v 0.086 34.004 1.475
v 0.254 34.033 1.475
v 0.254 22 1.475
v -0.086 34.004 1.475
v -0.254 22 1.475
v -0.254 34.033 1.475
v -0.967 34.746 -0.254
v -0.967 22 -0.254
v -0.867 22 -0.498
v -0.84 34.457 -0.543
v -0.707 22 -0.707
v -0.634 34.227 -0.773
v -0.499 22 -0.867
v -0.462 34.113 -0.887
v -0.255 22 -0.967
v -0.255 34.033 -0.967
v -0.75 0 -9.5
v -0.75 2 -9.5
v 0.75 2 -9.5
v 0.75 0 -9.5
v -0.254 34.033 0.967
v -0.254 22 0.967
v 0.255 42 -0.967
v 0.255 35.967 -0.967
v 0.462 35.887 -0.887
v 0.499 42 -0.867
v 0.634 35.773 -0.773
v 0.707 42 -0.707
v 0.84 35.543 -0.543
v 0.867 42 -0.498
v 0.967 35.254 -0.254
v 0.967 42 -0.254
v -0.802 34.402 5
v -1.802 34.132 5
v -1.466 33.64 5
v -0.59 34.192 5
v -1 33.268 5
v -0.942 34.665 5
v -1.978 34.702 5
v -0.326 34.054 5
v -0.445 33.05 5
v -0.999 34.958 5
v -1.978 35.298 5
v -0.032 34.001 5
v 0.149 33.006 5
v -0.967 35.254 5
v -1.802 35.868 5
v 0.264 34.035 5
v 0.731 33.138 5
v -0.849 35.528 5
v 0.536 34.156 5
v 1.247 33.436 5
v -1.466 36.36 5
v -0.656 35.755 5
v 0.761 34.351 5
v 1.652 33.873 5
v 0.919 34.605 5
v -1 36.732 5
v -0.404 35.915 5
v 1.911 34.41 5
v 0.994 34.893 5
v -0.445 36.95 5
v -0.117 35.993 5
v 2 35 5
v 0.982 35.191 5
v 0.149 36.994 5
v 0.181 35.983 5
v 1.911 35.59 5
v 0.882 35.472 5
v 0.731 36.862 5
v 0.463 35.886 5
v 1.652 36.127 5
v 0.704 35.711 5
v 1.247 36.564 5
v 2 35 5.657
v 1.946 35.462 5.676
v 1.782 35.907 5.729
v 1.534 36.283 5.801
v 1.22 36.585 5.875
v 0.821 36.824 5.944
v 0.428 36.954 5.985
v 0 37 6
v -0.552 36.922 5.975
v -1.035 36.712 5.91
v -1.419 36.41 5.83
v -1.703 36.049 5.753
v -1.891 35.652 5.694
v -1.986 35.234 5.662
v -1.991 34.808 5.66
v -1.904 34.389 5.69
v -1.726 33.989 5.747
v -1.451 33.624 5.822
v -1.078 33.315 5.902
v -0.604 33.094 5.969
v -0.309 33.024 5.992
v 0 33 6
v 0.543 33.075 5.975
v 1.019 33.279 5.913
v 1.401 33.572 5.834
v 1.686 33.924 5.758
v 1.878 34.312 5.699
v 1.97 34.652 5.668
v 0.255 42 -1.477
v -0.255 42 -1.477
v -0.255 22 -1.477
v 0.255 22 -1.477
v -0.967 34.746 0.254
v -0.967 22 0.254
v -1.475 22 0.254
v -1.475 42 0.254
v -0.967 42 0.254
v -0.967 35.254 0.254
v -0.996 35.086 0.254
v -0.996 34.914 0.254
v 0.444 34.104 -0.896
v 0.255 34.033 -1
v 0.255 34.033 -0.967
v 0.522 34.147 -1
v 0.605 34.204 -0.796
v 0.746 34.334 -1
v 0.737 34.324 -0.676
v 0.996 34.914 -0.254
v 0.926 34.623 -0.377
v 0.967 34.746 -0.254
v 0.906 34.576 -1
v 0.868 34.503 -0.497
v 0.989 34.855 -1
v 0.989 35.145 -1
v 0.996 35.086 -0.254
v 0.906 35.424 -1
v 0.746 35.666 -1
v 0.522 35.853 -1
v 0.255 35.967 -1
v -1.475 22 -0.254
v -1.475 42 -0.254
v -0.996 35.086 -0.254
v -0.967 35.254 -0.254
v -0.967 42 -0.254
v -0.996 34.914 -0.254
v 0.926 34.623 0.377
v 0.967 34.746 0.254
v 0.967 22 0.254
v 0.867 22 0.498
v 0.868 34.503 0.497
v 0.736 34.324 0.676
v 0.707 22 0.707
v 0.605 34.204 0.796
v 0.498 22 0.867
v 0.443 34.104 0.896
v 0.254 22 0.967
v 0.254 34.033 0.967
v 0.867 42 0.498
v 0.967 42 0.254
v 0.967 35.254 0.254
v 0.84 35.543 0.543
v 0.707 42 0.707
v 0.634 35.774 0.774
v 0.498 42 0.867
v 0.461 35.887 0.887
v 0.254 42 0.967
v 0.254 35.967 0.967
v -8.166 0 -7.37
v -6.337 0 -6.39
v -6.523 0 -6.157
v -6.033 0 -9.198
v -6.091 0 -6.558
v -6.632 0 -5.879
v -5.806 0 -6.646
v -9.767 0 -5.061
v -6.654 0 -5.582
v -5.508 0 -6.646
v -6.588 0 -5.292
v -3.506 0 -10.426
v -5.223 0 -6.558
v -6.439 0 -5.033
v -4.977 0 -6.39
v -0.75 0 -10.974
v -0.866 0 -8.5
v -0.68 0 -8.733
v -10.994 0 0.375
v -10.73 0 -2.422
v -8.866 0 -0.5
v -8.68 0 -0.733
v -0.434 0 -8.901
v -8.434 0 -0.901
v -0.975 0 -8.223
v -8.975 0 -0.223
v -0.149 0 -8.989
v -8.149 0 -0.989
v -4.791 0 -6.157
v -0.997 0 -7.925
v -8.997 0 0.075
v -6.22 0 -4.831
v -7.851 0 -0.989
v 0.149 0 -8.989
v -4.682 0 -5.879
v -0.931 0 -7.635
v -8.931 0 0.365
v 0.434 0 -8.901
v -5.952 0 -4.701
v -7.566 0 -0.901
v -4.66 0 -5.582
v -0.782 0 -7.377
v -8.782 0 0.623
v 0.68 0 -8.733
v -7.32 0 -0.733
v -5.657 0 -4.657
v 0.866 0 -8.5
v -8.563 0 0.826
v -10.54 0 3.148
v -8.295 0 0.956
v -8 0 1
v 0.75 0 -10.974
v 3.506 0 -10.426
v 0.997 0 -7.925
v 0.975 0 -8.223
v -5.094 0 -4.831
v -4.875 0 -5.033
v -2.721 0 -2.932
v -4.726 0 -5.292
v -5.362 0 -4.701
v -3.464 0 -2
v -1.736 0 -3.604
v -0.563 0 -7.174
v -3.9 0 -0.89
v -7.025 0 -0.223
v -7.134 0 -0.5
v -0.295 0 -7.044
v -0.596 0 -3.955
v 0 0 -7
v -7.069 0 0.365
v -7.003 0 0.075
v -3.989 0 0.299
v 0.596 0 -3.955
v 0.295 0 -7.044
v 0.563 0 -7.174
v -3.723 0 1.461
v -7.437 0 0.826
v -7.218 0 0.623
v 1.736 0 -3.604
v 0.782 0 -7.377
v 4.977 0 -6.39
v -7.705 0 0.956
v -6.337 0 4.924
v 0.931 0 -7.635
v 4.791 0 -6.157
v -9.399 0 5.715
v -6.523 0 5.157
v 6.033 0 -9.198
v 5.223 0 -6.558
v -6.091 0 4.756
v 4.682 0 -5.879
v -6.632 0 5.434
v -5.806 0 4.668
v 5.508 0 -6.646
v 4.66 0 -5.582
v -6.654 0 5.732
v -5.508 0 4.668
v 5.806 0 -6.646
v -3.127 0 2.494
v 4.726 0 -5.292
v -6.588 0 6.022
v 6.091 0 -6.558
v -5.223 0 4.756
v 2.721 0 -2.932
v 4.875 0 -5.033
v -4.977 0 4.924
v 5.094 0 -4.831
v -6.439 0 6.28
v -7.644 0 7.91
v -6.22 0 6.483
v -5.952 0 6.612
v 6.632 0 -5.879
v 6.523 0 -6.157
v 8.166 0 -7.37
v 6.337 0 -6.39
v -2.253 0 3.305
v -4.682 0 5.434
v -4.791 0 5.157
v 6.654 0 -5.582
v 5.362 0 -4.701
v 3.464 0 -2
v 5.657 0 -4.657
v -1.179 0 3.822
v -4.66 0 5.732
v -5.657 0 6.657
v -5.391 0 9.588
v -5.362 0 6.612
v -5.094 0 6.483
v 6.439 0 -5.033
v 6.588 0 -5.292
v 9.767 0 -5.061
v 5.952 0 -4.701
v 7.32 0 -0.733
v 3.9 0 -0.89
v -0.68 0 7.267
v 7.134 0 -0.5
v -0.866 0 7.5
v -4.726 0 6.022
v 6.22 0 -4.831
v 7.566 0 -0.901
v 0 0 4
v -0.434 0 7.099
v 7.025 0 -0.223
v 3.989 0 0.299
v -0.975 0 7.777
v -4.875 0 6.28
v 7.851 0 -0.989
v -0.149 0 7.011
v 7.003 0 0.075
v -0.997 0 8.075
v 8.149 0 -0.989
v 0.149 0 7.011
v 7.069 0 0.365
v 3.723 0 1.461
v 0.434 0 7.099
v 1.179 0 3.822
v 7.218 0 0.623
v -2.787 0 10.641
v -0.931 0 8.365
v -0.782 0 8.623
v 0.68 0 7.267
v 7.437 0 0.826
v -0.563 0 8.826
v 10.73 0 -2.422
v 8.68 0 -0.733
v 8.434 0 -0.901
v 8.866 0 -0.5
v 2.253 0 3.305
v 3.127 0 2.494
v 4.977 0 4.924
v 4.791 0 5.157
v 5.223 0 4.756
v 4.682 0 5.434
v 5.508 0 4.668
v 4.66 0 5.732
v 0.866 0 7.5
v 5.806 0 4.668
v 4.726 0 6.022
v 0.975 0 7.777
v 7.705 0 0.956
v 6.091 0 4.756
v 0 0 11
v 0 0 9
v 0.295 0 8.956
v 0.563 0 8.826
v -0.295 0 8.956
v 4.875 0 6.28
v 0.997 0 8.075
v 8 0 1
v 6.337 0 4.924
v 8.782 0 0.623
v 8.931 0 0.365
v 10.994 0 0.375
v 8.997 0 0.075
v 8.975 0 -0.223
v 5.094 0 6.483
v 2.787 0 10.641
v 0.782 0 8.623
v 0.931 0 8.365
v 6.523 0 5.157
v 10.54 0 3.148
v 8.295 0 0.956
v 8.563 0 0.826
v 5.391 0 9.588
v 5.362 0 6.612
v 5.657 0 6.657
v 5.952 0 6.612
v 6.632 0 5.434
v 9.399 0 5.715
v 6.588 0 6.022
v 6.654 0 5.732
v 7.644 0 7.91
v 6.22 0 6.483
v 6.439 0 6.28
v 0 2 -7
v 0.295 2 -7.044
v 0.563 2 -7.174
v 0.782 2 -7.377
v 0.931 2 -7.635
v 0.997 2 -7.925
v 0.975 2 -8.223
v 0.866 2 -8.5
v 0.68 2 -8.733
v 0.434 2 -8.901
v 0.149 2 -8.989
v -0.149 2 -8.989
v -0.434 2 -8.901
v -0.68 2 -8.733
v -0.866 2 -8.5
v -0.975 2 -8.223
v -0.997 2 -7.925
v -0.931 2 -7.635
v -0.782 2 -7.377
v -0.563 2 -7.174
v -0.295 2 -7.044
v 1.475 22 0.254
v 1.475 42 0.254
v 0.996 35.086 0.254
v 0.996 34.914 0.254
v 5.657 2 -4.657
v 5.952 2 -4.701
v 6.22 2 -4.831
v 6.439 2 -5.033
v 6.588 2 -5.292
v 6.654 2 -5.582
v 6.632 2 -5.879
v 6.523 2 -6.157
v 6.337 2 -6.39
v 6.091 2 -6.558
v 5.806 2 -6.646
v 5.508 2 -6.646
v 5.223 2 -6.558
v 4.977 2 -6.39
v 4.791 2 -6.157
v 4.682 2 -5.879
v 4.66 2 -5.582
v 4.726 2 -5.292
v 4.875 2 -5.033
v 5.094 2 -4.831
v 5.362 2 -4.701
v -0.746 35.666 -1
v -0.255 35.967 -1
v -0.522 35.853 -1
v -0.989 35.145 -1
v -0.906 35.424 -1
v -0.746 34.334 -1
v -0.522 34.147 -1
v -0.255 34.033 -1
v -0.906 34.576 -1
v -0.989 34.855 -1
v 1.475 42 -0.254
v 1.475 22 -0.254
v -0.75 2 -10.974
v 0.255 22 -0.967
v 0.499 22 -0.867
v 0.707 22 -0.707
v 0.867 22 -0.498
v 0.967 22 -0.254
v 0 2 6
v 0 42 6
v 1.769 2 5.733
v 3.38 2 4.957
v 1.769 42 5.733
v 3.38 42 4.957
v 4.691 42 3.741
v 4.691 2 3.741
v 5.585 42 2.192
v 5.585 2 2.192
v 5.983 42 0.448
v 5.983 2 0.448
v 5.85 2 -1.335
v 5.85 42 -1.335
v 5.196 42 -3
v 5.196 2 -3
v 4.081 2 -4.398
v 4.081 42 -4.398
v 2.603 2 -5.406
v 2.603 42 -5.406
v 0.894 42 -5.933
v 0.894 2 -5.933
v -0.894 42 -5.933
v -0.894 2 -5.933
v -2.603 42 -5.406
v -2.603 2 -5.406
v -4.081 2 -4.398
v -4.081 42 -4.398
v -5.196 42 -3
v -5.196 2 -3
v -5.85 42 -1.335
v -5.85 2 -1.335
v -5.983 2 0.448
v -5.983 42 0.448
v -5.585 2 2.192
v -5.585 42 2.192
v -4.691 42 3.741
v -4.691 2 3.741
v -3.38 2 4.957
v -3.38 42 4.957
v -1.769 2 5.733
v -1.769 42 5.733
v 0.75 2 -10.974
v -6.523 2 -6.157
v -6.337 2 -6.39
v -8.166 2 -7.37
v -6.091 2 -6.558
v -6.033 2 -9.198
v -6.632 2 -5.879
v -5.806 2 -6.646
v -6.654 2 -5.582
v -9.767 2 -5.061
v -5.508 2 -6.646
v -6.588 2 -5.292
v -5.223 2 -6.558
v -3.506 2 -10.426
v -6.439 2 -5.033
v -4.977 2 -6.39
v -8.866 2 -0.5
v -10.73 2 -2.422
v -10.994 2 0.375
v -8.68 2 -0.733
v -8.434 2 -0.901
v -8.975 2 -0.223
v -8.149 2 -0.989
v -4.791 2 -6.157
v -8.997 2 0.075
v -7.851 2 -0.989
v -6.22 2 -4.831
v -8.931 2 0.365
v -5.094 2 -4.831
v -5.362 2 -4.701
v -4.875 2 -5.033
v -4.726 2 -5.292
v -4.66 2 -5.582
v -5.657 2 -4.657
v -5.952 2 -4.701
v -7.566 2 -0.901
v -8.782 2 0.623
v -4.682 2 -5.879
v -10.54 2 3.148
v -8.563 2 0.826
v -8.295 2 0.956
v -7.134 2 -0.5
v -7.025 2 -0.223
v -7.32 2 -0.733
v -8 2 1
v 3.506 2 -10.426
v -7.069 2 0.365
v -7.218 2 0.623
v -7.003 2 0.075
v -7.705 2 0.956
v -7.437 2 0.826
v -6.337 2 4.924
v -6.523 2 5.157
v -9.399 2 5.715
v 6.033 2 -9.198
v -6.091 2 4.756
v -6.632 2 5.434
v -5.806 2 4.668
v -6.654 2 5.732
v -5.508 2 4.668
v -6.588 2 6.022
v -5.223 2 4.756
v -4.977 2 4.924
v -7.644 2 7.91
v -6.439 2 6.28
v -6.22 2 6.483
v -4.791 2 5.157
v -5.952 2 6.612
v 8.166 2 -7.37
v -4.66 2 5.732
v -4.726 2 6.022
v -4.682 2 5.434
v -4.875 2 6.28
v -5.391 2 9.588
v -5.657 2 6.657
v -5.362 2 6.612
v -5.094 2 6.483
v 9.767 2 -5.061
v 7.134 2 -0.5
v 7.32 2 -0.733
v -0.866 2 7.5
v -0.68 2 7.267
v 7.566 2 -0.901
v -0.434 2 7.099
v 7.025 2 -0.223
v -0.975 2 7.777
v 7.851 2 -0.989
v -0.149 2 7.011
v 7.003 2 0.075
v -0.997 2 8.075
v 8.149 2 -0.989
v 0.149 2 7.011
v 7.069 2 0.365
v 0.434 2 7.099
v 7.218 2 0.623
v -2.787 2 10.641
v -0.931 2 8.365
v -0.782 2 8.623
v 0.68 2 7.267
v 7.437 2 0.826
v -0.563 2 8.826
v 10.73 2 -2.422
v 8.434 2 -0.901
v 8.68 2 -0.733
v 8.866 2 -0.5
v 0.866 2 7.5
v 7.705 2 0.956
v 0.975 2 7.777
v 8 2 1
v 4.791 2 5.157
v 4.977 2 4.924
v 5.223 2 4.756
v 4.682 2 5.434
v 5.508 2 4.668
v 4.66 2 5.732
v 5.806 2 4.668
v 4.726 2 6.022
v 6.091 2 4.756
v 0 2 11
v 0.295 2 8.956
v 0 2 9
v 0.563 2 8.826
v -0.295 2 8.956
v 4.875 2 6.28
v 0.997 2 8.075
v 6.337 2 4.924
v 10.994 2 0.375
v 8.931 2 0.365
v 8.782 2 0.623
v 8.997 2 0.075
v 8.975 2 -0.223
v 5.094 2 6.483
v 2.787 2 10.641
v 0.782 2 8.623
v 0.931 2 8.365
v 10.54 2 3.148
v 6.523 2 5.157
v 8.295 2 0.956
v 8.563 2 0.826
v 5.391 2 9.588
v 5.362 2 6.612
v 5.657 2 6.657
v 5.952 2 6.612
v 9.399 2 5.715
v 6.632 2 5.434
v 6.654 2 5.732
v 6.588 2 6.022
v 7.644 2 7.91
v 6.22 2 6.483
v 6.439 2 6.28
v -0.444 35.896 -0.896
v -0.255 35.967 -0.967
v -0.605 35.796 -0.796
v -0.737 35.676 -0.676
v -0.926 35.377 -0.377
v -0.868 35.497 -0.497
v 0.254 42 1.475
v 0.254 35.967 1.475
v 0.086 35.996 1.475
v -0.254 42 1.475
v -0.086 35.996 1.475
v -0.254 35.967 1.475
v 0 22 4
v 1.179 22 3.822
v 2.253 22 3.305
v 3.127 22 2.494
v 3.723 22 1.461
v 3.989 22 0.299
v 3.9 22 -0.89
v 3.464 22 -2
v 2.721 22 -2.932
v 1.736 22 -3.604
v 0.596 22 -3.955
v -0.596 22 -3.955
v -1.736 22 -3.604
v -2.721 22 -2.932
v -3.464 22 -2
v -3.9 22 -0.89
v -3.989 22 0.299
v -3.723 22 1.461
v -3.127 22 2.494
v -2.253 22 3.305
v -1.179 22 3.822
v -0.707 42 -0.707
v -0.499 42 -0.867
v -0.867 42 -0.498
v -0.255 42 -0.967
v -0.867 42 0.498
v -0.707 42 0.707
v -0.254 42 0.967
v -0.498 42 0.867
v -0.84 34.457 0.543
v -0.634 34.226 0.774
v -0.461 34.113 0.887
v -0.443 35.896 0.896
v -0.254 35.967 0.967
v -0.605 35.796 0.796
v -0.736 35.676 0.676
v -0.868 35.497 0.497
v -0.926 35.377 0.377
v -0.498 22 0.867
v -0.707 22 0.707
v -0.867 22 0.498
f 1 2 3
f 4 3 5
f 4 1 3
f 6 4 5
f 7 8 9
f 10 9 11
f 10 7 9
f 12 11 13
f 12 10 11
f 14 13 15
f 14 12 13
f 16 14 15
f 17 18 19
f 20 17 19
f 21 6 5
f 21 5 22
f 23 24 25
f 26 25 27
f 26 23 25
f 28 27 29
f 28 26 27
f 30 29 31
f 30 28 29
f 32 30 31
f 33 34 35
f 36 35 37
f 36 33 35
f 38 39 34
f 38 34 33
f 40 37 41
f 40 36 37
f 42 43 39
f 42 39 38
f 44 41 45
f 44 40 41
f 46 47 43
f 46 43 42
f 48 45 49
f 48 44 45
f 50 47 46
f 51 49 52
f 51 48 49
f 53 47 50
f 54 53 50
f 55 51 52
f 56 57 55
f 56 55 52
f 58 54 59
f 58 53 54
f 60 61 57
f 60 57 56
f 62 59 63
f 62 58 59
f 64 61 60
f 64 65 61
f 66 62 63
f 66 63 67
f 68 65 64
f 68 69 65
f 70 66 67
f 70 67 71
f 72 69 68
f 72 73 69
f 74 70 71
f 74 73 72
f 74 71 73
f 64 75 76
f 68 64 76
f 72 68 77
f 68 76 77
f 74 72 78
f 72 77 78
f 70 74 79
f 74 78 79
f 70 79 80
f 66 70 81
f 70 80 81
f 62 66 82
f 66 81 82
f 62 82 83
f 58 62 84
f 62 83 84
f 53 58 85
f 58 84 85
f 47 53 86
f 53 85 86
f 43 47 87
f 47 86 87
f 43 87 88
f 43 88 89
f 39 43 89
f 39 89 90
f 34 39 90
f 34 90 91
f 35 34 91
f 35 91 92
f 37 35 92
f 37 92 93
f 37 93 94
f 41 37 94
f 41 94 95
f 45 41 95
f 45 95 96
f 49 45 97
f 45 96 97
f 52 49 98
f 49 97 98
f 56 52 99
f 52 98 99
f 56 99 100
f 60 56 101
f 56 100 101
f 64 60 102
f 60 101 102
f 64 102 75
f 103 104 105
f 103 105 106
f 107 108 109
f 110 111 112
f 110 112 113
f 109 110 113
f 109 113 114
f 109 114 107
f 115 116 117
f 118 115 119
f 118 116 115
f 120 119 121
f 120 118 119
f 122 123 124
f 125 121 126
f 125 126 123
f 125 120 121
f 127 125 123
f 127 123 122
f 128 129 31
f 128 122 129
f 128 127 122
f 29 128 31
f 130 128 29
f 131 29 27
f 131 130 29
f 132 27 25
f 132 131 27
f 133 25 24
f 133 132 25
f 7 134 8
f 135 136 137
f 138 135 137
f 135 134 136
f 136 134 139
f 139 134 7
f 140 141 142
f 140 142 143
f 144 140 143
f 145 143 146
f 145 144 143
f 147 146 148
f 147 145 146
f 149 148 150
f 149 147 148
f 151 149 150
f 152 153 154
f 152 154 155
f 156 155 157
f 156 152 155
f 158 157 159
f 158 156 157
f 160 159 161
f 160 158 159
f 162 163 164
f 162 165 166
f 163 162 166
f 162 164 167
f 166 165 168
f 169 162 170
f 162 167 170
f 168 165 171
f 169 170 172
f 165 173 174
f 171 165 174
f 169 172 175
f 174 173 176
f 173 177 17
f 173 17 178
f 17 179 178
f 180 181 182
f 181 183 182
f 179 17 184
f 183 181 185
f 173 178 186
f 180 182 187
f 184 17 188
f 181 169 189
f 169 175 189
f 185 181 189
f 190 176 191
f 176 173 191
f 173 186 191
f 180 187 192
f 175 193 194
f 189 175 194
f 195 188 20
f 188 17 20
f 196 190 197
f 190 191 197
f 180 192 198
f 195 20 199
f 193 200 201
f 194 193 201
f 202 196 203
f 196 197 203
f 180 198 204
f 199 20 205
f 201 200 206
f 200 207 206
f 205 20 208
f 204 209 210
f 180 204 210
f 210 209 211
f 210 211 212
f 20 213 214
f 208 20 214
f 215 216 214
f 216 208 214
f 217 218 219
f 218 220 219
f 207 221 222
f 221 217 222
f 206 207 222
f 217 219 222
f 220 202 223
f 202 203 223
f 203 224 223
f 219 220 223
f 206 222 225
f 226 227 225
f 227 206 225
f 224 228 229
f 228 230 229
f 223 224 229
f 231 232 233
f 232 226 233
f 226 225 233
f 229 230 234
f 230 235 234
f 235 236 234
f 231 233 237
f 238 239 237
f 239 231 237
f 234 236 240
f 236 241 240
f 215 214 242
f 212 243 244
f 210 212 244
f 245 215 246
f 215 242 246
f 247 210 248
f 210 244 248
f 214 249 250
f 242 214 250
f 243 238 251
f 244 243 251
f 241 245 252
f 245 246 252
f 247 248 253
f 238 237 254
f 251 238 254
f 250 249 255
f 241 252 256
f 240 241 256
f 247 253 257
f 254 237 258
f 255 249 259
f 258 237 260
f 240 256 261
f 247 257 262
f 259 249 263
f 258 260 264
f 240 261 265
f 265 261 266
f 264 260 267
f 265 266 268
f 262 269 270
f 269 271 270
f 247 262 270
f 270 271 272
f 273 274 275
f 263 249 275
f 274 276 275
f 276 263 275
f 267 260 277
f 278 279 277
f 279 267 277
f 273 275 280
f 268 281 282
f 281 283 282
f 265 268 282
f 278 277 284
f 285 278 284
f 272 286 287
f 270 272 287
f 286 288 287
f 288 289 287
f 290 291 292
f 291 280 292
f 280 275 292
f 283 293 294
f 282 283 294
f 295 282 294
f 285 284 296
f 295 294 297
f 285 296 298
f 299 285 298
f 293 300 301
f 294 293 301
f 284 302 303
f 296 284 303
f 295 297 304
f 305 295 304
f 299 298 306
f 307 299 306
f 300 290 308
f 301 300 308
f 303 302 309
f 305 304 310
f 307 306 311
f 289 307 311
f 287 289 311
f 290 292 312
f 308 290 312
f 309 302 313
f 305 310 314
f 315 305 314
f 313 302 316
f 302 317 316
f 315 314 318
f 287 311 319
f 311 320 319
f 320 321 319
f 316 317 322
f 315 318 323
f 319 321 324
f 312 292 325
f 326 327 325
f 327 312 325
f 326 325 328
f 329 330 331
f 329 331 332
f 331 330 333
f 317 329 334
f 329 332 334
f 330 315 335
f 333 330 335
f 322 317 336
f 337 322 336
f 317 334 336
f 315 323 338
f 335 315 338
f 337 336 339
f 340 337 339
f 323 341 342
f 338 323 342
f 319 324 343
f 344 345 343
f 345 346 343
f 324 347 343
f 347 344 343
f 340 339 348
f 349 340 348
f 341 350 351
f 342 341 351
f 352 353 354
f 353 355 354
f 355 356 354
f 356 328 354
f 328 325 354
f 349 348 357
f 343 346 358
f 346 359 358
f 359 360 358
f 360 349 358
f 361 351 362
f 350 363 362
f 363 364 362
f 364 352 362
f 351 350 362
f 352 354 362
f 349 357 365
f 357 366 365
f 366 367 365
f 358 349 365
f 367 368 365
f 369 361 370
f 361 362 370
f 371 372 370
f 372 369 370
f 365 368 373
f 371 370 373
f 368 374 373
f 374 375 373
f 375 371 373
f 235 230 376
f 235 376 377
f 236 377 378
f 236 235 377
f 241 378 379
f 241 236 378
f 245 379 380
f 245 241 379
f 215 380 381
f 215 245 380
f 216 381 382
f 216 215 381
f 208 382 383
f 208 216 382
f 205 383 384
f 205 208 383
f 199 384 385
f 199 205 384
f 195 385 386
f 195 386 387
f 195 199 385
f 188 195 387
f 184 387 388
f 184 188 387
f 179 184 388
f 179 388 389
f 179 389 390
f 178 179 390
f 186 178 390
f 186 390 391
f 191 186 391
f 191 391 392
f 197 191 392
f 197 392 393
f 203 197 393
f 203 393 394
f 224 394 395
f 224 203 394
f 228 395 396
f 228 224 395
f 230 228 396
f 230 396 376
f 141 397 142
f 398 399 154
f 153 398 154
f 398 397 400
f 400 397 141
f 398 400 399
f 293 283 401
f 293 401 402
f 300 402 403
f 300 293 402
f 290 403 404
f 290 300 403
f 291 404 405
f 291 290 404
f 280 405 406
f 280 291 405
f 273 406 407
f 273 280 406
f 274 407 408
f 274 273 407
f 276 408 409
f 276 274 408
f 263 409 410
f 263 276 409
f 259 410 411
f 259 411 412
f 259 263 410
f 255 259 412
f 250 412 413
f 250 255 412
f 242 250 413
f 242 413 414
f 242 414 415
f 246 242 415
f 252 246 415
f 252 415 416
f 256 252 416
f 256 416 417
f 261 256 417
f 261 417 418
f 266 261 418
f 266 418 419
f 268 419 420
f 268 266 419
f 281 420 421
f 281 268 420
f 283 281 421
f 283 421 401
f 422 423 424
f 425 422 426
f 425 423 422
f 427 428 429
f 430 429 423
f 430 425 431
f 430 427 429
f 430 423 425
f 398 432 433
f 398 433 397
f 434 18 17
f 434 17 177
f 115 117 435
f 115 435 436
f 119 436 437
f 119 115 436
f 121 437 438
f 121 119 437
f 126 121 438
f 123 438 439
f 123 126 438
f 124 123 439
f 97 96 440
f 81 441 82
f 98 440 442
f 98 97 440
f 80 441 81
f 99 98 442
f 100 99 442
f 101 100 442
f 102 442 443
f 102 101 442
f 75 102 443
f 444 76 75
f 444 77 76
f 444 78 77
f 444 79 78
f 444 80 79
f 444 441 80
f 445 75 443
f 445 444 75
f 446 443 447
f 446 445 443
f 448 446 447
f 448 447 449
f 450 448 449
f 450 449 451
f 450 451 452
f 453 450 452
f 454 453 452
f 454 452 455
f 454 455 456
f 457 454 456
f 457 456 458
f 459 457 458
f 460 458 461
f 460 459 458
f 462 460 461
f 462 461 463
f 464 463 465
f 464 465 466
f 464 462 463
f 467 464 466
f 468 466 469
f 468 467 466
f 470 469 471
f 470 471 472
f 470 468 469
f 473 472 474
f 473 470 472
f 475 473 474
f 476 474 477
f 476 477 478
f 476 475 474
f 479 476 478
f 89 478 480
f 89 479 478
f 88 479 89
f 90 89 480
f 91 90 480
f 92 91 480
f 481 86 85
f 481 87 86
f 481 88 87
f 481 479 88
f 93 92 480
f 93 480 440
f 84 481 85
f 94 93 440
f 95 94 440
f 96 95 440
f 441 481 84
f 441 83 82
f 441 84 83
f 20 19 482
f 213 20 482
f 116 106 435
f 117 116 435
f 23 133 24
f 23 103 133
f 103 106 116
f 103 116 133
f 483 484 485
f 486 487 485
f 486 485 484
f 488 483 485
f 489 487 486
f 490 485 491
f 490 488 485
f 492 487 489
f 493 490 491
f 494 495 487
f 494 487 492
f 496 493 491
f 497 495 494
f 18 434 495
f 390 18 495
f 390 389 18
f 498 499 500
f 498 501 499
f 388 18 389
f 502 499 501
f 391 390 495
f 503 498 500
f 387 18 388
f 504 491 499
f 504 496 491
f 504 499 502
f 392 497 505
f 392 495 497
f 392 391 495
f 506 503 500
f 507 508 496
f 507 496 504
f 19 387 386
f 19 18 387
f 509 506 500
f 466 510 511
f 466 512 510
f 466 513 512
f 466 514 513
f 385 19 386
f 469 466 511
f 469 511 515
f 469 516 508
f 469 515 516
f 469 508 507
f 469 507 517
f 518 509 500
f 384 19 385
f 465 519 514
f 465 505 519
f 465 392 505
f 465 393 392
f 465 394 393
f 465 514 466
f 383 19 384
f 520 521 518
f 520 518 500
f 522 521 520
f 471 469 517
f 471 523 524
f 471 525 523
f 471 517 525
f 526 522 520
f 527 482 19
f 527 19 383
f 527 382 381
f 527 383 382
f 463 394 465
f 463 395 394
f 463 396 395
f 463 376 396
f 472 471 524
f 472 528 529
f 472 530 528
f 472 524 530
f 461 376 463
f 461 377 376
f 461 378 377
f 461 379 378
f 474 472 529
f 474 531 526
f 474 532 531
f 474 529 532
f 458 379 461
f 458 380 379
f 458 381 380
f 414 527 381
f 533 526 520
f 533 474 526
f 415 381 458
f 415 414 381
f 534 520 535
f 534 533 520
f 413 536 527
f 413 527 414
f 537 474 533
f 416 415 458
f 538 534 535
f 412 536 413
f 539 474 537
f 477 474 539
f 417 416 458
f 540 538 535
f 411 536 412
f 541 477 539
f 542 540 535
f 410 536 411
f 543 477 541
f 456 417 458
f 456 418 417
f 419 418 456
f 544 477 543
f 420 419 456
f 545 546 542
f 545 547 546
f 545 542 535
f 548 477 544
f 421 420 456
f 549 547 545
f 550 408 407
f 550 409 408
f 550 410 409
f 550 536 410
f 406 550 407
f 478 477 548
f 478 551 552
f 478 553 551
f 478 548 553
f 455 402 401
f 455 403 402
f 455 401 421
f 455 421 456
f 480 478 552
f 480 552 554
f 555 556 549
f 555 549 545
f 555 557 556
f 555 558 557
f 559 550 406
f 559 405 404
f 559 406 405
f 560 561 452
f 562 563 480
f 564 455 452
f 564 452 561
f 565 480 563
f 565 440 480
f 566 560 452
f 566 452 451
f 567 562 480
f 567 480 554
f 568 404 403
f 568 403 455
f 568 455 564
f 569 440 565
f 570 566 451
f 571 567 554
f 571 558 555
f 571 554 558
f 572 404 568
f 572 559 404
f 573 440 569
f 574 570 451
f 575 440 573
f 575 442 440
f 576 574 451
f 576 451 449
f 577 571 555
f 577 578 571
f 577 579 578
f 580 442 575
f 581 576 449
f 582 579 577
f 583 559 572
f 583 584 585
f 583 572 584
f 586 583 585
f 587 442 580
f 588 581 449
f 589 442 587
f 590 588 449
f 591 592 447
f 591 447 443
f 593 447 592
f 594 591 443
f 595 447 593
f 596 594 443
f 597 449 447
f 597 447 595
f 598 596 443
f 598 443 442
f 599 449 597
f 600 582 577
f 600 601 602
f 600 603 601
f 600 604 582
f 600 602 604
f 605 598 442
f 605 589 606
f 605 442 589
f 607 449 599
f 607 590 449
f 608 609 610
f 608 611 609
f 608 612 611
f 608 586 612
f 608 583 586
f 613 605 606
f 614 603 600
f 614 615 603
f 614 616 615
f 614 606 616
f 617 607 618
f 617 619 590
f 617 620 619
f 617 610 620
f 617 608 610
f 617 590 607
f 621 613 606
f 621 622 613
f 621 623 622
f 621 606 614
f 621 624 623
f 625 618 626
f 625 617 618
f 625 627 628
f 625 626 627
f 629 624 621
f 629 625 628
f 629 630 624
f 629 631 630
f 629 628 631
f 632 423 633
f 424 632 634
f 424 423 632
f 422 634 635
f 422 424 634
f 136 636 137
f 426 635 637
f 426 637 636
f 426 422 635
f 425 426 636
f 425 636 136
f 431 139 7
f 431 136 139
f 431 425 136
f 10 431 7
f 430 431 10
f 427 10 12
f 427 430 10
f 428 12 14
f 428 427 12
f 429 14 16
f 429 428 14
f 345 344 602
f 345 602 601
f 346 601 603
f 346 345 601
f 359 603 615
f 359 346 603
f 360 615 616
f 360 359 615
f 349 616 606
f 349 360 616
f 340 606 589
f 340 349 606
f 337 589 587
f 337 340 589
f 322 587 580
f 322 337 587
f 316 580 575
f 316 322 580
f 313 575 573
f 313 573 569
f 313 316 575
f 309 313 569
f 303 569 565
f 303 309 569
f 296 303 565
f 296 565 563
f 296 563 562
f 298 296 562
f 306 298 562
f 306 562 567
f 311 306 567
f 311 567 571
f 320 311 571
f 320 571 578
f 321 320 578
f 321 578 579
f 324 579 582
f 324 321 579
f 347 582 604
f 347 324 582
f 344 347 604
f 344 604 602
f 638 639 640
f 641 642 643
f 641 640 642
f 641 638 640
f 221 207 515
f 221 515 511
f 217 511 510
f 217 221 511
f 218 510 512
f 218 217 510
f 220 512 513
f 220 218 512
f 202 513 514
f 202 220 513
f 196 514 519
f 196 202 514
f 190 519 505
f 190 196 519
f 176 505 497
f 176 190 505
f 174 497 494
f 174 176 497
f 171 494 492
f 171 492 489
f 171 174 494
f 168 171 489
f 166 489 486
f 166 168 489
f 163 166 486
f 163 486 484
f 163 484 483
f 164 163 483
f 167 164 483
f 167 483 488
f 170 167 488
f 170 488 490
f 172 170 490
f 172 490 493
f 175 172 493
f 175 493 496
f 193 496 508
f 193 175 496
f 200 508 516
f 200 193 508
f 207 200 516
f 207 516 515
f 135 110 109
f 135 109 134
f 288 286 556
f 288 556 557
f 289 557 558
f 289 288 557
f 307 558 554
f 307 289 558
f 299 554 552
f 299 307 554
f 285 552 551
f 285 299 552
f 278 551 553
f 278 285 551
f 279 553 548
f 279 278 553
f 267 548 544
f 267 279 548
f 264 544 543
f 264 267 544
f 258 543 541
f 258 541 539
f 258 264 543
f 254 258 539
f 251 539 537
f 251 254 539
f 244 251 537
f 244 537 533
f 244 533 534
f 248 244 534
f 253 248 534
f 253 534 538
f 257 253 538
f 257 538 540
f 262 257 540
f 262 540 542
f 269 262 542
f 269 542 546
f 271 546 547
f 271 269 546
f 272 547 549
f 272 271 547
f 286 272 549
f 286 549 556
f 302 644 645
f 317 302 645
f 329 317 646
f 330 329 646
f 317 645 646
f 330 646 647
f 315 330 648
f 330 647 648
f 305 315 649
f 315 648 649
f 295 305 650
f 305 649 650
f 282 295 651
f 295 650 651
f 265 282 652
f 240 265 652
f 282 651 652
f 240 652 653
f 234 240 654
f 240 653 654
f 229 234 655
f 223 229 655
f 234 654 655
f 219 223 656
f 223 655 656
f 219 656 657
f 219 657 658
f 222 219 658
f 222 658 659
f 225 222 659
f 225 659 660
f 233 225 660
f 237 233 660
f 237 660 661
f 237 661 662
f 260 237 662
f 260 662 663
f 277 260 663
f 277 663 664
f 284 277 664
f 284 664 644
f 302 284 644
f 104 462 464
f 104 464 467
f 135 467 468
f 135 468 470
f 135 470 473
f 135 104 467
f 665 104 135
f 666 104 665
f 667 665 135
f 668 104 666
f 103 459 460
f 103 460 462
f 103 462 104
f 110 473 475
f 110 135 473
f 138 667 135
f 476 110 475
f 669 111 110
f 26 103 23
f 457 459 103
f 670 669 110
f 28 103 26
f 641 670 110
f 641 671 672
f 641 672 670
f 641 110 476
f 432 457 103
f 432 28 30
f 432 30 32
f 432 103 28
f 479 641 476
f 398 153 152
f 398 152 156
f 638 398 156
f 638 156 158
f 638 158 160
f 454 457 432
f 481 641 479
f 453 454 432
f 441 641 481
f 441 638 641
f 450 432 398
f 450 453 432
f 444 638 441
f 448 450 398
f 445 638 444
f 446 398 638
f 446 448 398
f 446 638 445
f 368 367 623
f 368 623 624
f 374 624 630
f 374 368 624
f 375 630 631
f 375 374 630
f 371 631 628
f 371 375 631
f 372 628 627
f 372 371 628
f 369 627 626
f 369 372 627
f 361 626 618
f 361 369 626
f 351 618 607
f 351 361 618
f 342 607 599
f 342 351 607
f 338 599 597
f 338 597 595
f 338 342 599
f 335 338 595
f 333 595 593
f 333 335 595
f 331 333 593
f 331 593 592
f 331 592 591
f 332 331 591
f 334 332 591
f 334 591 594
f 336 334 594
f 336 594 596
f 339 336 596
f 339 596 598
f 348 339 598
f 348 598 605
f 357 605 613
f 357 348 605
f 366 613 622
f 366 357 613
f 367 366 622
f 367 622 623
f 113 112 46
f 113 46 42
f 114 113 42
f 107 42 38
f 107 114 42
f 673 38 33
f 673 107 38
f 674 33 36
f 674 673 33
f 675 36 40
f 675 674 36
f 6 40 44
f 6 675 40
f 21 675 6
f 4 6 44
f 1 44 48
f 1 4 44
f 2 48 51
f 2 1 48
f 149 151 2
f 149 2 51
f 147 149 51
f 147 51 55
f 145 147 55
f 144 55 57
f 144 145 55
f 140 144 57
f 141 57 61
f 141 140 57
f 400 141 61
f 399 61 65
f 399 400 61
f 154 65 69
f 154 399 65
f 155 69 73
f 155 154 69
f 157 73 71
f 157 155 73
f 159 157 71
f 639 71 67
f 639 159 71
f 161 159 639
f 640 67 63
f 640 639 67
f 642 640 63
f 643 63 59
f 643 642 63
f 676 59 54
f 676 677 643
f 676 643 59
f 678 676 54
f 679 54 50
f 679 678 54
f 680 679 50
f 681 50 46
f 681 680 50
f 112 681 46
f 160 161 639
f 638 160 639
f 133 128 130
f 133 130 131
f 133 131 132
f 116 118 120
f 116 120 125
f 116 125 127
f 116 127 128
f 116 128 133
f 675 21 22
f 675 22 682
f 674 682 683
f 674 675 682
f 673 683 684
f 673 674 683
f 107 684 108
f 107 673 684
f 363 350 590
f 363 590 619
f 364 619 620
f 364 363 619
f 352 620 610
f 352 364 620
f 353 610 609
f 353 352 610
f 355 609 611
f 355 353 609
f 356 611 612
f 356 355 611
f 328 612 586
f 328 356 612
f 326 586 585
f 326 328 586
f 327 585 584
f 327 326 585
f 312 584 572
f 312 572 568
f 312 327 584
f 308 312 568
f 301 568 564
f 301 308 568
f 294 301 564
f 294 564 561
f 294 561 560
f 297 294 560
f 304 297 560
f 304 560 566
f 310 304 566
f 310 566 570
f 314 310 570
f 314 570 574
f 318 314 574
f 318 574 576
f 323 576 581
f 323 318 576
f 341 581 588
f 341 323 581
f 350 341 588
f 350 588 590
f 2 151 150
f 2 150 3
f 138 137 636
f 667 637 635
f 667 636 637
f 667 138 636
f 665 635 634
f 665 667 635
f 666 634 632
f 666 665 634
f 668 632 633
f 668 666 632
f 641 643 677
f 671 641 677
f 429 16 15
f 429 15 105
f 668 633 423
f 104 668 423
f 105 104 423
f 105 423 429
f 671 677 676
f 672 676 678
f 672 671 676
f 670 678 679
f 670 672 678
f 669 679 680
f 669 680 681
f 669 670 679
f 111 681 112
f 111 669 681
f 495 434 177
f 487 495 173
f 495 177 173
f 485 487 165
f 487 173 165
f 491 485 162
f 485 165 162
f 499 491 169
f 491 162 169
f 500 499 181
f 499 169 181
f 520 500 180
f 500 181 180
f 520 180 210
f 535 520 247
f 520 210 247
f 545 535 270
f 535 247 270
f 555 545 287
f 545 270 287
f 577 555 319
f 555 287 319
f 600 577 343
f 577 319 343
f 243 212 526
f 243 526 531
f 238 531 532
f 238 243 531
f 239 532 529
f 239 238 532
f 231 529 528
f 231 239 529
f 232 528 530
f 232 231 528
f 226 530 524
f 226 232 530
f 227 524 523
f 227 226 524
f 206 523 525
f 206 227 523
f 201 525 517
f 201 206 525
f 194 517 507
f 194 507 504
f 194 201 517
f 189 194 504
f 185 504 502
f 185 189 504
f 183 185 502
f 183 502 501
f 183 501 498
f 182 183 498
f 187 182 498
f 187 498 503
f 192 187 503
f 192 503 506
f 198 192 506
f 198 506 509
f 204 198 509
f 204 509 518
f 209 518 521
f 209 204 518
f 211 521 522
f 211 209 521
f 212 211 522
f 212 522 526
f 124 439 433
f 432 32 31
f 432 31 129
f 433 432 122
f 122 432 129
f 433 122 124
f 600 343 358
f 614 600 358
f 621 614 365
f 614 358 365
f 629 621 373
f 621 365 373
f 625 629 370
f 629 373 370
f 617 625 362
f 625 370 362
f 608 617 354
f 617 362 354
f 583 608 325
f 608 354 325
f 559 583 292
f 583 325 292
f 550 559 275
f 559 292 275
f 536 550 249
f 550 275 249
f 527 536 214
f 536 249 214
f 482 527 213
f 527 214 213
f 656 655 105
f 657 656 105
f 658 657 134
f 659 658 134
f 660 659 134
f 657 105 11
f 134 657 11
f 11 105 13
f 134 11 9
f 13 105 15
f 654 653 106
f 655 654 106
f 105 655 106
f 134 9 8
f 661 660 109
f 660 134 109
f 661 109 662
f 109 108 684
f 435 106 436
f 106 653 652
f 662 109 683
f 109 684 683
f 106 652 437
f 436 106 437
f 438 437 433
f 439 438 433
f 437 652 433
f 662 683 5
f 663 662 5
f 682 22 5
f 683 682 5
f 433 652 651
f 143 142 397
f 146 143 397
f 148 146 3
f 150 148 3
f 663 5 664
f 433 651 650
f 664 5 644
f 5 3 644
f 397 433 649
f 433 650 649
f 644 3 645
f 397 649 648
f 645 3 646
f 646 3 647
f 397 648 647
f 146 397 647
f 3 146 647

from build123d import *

# Parameters (mm, degrees)
SKETCH1_R               = 11
SKETCH1_R_2             = 1
BOSS_EXTRUDE1_DEPTH     = 2
SKETCH2_R               = 4
CUT_EXTRUDE1_DEPTH      = 16.684387141
SKETCH4_W               = 1.5
SKETCH4_H               = 3
CUT_EXTRUDE3_DEPTH      = 4
BOSS_EXTRUDE2_START     = 20
SKETCH5_R               = 6
SKETCH5_R_2             = 4
BOSS_EXTRUDE2_DEPTH     = 20
BOSS_EXTRUDE3_START     = 20
SKETCH6_R               = 6
BOSS_EXTRUDE3_DEPTH     = 20
CUT_EXTRUDE4_DEPTH      = 5
CUT_EXTRUDE4_DEPTH_BACK = 1
SKETCH7_R               = 1
SKETCH8_R               = 2
CUT_EXTRUDE5_DEPTH      = 1


with BuildPart() as part:
    # Sketch1 → Boss-Extrude1 (new body)
    with BuildSketch(Plane(origin=(0, 0, 0), x_dir=(1, 0, 0), z_dir=(0, 1, 0))):
        with Locations(Location((0, 0, 0), (0, 0, 270))):
            Circle(SKETCH1_R)
        with Locations(Location((0, 8, 0), (0, 0, 270))):
            Circle(SKETCH1_R_2, mode=Mode.SUBTRACT)
        with Locations(Location((5.656854249, 5.656854249, 0), (0, 0, 270))):
            Circle(SKETCH1_R_2, mode=Mode.SUBTRACT)
        with Locations(Location((8, 0, 0), (0, 0, 270))):
            Circle(SKETCH1_R_2, mode=Mode.SUBTRACT)
        with Locations(Location((5.656854249, -5.656854249, 0), (0, 0, 270))):
            Circle(SKETCH1_R_2, mode=Mode.SUBTRACT)
        with Locations(Location((0, -8, 0), (0, 0, 270))):
            Circle(SKETCH1_R_2, mode=Mode.SUBTRACT)
        with Locations(Location((-5.656854249, -5.656854249, 0), (0, 0, 270))):
            Circle(SKETCH1_R_2, mode=Mode.SUBTRACT)
        with Locations(Location((-8, 0, 0), (0, 0, 270))):
            Circle(SKETCH1_R_2, mode=Mode.SUBTRACT)
        with Locations(Location((-5.656854249, 5.656854249, 0), (0, 0, 270))):
            Circle(SKETCH1_R_2, mode=Mode.SUBTRACT)
    extrude(amount=BOSS_EXTRUDE1_DEPTH)

    # Sketch2 → Cut-Extrude1 (cut, through all)
    with BuildSketch(Plane(origin=(0, 2, 0), x_dir=(1, 0, 0), z_dir=(0, 1, 0))):
        with Locations(Location((0, 0, 0), (0, 0, 270))):
            Circle(SKETCH2_R)
    extrude(amount=-CUT_EXTRUDE1_DEPTH, mode=Mode.SUBTRACT)

    # Sketch4 → Cut-Extrude3 (cut)
    with BuildSketch(Plane(origin=(0, 2, 0), x_dir=(1, 0, 0), z_dir=(0, 1, 0))):
        with Locations((0, 11)):
            Rectangle(SKETCH4_W, SKETCH4_H)
    extrude(amount=-CUT_EXTRUDE3_DEPTH, mode=Mode.SUBTRACT)

    # Sketch5 → Boss-Extrude2 (add)
    with BuildSketch(Plane(origin=(0, 2, 0), x_dir=(1, 0, 0), z_dir=(0, 1, 0)).offset(BOSS_EXTRUDE2_START)):
        with Locations(Location((0, 0, 0), (0, 0, 270))):
            Circle(SKETCH5_R)
        with Locations(Location((0, 0, 0), (0, 0, 270))):
            Circle(SKETCH5_R_2, mode=Mode.SUBTRACT)
    extrude(amount=-BOSS_EXTRUDE2_DEPTH)

    # Sketch6 → Boss-Extrude3 (add)
    with BuildSketch(Plane(origin=(0, 22, 0), x_dir=(1, 0, 0), z_dir=(0, 1, 0)).offset(BOSS_EXTRUDE3_START)):
        with Locations(Location((0, 0, 0), (0, 0, 270))):
            Circle(SKETCH6_R)
        with BuildLine():
            ThreePointArc((-0.967204218, 0.254), (-0.707472278, 0.706741095), (-0.255, 0.966941053))
            Line((-0.255, 0.966941053), (-0.255, 1.476941053))
            Line((-0.255, 1.476941053), (0.255, 1.476941053))
            Line((0.255, 1.476941053), (0.255, 0.966941053))
            ThreePointArc((0.255, 0.966941053), (0.707472278, 0.706741095), (0.967204218, 0.254))
            Line((0.967204218, 0.254), (1.475204218, 0.254))
            Line((1.475204218, 0.254), (1.475204218, -0.254))
            Line((1.475204218, -0.254), (0.967204218, -0.254))
            ThreePointArc((0.967204218, -0.254), (0.707106781, -0.707106781), (0.254, -0.967204218))
            Line((0.254, -0.967204218), (0.254, -1.475204218))
            Line((0.254, -1.475204218), (-0.254, -1.475204218))
            Line((-0.254, -1.475204218), (-0.254, -0.967204218))
            ThreePointArc((-0.254, -0.967204218), (-0.707106781, -0.707106781), (-0.967204218, -0.254))
            Line((-0.967204218, -0.254), (-1.475204218, -0.254))
            Line((-1.475204218, -0.254), (-1.475204218, 0.254))
            Line((-1.475204218, 0.254), (-0.967204218, 0.254))
        make_face(mode=Mode.SUBTRACT)
    extrude(amount=-BOSS_EXTRUDE3_DEPTH)

    # Sketch7 → Cut-Extrude4 (cut, two sides: drawn at the far end of the back side and taken through both)
    with BuildSketch(Plane.XY.offset(-CUT_EXTRUDE4_DEPTH_BACK)):
        with Locations(Location((0, 35, 0), (0, 0, 165.285661458))):
            Circle(SKETCH7_R)
    extrude(amount=CUT_EXTRUDE4_DEPTH + CUT_EXTRUDE4_DEPTH_BACK, mode=Mode.SUBTRACT)

    # Sketch8 → Cut-Extrude5 (cut)
    with BuildSketch(Plane.XY.offset(6)):
        with Locations((0, 35)):
            Circle(SKETCH8_R)
    extrude(amount=-CUT_EXTRUDE5_DEPTH, mode=Mode.SUBTRACT)


solid = part.part
